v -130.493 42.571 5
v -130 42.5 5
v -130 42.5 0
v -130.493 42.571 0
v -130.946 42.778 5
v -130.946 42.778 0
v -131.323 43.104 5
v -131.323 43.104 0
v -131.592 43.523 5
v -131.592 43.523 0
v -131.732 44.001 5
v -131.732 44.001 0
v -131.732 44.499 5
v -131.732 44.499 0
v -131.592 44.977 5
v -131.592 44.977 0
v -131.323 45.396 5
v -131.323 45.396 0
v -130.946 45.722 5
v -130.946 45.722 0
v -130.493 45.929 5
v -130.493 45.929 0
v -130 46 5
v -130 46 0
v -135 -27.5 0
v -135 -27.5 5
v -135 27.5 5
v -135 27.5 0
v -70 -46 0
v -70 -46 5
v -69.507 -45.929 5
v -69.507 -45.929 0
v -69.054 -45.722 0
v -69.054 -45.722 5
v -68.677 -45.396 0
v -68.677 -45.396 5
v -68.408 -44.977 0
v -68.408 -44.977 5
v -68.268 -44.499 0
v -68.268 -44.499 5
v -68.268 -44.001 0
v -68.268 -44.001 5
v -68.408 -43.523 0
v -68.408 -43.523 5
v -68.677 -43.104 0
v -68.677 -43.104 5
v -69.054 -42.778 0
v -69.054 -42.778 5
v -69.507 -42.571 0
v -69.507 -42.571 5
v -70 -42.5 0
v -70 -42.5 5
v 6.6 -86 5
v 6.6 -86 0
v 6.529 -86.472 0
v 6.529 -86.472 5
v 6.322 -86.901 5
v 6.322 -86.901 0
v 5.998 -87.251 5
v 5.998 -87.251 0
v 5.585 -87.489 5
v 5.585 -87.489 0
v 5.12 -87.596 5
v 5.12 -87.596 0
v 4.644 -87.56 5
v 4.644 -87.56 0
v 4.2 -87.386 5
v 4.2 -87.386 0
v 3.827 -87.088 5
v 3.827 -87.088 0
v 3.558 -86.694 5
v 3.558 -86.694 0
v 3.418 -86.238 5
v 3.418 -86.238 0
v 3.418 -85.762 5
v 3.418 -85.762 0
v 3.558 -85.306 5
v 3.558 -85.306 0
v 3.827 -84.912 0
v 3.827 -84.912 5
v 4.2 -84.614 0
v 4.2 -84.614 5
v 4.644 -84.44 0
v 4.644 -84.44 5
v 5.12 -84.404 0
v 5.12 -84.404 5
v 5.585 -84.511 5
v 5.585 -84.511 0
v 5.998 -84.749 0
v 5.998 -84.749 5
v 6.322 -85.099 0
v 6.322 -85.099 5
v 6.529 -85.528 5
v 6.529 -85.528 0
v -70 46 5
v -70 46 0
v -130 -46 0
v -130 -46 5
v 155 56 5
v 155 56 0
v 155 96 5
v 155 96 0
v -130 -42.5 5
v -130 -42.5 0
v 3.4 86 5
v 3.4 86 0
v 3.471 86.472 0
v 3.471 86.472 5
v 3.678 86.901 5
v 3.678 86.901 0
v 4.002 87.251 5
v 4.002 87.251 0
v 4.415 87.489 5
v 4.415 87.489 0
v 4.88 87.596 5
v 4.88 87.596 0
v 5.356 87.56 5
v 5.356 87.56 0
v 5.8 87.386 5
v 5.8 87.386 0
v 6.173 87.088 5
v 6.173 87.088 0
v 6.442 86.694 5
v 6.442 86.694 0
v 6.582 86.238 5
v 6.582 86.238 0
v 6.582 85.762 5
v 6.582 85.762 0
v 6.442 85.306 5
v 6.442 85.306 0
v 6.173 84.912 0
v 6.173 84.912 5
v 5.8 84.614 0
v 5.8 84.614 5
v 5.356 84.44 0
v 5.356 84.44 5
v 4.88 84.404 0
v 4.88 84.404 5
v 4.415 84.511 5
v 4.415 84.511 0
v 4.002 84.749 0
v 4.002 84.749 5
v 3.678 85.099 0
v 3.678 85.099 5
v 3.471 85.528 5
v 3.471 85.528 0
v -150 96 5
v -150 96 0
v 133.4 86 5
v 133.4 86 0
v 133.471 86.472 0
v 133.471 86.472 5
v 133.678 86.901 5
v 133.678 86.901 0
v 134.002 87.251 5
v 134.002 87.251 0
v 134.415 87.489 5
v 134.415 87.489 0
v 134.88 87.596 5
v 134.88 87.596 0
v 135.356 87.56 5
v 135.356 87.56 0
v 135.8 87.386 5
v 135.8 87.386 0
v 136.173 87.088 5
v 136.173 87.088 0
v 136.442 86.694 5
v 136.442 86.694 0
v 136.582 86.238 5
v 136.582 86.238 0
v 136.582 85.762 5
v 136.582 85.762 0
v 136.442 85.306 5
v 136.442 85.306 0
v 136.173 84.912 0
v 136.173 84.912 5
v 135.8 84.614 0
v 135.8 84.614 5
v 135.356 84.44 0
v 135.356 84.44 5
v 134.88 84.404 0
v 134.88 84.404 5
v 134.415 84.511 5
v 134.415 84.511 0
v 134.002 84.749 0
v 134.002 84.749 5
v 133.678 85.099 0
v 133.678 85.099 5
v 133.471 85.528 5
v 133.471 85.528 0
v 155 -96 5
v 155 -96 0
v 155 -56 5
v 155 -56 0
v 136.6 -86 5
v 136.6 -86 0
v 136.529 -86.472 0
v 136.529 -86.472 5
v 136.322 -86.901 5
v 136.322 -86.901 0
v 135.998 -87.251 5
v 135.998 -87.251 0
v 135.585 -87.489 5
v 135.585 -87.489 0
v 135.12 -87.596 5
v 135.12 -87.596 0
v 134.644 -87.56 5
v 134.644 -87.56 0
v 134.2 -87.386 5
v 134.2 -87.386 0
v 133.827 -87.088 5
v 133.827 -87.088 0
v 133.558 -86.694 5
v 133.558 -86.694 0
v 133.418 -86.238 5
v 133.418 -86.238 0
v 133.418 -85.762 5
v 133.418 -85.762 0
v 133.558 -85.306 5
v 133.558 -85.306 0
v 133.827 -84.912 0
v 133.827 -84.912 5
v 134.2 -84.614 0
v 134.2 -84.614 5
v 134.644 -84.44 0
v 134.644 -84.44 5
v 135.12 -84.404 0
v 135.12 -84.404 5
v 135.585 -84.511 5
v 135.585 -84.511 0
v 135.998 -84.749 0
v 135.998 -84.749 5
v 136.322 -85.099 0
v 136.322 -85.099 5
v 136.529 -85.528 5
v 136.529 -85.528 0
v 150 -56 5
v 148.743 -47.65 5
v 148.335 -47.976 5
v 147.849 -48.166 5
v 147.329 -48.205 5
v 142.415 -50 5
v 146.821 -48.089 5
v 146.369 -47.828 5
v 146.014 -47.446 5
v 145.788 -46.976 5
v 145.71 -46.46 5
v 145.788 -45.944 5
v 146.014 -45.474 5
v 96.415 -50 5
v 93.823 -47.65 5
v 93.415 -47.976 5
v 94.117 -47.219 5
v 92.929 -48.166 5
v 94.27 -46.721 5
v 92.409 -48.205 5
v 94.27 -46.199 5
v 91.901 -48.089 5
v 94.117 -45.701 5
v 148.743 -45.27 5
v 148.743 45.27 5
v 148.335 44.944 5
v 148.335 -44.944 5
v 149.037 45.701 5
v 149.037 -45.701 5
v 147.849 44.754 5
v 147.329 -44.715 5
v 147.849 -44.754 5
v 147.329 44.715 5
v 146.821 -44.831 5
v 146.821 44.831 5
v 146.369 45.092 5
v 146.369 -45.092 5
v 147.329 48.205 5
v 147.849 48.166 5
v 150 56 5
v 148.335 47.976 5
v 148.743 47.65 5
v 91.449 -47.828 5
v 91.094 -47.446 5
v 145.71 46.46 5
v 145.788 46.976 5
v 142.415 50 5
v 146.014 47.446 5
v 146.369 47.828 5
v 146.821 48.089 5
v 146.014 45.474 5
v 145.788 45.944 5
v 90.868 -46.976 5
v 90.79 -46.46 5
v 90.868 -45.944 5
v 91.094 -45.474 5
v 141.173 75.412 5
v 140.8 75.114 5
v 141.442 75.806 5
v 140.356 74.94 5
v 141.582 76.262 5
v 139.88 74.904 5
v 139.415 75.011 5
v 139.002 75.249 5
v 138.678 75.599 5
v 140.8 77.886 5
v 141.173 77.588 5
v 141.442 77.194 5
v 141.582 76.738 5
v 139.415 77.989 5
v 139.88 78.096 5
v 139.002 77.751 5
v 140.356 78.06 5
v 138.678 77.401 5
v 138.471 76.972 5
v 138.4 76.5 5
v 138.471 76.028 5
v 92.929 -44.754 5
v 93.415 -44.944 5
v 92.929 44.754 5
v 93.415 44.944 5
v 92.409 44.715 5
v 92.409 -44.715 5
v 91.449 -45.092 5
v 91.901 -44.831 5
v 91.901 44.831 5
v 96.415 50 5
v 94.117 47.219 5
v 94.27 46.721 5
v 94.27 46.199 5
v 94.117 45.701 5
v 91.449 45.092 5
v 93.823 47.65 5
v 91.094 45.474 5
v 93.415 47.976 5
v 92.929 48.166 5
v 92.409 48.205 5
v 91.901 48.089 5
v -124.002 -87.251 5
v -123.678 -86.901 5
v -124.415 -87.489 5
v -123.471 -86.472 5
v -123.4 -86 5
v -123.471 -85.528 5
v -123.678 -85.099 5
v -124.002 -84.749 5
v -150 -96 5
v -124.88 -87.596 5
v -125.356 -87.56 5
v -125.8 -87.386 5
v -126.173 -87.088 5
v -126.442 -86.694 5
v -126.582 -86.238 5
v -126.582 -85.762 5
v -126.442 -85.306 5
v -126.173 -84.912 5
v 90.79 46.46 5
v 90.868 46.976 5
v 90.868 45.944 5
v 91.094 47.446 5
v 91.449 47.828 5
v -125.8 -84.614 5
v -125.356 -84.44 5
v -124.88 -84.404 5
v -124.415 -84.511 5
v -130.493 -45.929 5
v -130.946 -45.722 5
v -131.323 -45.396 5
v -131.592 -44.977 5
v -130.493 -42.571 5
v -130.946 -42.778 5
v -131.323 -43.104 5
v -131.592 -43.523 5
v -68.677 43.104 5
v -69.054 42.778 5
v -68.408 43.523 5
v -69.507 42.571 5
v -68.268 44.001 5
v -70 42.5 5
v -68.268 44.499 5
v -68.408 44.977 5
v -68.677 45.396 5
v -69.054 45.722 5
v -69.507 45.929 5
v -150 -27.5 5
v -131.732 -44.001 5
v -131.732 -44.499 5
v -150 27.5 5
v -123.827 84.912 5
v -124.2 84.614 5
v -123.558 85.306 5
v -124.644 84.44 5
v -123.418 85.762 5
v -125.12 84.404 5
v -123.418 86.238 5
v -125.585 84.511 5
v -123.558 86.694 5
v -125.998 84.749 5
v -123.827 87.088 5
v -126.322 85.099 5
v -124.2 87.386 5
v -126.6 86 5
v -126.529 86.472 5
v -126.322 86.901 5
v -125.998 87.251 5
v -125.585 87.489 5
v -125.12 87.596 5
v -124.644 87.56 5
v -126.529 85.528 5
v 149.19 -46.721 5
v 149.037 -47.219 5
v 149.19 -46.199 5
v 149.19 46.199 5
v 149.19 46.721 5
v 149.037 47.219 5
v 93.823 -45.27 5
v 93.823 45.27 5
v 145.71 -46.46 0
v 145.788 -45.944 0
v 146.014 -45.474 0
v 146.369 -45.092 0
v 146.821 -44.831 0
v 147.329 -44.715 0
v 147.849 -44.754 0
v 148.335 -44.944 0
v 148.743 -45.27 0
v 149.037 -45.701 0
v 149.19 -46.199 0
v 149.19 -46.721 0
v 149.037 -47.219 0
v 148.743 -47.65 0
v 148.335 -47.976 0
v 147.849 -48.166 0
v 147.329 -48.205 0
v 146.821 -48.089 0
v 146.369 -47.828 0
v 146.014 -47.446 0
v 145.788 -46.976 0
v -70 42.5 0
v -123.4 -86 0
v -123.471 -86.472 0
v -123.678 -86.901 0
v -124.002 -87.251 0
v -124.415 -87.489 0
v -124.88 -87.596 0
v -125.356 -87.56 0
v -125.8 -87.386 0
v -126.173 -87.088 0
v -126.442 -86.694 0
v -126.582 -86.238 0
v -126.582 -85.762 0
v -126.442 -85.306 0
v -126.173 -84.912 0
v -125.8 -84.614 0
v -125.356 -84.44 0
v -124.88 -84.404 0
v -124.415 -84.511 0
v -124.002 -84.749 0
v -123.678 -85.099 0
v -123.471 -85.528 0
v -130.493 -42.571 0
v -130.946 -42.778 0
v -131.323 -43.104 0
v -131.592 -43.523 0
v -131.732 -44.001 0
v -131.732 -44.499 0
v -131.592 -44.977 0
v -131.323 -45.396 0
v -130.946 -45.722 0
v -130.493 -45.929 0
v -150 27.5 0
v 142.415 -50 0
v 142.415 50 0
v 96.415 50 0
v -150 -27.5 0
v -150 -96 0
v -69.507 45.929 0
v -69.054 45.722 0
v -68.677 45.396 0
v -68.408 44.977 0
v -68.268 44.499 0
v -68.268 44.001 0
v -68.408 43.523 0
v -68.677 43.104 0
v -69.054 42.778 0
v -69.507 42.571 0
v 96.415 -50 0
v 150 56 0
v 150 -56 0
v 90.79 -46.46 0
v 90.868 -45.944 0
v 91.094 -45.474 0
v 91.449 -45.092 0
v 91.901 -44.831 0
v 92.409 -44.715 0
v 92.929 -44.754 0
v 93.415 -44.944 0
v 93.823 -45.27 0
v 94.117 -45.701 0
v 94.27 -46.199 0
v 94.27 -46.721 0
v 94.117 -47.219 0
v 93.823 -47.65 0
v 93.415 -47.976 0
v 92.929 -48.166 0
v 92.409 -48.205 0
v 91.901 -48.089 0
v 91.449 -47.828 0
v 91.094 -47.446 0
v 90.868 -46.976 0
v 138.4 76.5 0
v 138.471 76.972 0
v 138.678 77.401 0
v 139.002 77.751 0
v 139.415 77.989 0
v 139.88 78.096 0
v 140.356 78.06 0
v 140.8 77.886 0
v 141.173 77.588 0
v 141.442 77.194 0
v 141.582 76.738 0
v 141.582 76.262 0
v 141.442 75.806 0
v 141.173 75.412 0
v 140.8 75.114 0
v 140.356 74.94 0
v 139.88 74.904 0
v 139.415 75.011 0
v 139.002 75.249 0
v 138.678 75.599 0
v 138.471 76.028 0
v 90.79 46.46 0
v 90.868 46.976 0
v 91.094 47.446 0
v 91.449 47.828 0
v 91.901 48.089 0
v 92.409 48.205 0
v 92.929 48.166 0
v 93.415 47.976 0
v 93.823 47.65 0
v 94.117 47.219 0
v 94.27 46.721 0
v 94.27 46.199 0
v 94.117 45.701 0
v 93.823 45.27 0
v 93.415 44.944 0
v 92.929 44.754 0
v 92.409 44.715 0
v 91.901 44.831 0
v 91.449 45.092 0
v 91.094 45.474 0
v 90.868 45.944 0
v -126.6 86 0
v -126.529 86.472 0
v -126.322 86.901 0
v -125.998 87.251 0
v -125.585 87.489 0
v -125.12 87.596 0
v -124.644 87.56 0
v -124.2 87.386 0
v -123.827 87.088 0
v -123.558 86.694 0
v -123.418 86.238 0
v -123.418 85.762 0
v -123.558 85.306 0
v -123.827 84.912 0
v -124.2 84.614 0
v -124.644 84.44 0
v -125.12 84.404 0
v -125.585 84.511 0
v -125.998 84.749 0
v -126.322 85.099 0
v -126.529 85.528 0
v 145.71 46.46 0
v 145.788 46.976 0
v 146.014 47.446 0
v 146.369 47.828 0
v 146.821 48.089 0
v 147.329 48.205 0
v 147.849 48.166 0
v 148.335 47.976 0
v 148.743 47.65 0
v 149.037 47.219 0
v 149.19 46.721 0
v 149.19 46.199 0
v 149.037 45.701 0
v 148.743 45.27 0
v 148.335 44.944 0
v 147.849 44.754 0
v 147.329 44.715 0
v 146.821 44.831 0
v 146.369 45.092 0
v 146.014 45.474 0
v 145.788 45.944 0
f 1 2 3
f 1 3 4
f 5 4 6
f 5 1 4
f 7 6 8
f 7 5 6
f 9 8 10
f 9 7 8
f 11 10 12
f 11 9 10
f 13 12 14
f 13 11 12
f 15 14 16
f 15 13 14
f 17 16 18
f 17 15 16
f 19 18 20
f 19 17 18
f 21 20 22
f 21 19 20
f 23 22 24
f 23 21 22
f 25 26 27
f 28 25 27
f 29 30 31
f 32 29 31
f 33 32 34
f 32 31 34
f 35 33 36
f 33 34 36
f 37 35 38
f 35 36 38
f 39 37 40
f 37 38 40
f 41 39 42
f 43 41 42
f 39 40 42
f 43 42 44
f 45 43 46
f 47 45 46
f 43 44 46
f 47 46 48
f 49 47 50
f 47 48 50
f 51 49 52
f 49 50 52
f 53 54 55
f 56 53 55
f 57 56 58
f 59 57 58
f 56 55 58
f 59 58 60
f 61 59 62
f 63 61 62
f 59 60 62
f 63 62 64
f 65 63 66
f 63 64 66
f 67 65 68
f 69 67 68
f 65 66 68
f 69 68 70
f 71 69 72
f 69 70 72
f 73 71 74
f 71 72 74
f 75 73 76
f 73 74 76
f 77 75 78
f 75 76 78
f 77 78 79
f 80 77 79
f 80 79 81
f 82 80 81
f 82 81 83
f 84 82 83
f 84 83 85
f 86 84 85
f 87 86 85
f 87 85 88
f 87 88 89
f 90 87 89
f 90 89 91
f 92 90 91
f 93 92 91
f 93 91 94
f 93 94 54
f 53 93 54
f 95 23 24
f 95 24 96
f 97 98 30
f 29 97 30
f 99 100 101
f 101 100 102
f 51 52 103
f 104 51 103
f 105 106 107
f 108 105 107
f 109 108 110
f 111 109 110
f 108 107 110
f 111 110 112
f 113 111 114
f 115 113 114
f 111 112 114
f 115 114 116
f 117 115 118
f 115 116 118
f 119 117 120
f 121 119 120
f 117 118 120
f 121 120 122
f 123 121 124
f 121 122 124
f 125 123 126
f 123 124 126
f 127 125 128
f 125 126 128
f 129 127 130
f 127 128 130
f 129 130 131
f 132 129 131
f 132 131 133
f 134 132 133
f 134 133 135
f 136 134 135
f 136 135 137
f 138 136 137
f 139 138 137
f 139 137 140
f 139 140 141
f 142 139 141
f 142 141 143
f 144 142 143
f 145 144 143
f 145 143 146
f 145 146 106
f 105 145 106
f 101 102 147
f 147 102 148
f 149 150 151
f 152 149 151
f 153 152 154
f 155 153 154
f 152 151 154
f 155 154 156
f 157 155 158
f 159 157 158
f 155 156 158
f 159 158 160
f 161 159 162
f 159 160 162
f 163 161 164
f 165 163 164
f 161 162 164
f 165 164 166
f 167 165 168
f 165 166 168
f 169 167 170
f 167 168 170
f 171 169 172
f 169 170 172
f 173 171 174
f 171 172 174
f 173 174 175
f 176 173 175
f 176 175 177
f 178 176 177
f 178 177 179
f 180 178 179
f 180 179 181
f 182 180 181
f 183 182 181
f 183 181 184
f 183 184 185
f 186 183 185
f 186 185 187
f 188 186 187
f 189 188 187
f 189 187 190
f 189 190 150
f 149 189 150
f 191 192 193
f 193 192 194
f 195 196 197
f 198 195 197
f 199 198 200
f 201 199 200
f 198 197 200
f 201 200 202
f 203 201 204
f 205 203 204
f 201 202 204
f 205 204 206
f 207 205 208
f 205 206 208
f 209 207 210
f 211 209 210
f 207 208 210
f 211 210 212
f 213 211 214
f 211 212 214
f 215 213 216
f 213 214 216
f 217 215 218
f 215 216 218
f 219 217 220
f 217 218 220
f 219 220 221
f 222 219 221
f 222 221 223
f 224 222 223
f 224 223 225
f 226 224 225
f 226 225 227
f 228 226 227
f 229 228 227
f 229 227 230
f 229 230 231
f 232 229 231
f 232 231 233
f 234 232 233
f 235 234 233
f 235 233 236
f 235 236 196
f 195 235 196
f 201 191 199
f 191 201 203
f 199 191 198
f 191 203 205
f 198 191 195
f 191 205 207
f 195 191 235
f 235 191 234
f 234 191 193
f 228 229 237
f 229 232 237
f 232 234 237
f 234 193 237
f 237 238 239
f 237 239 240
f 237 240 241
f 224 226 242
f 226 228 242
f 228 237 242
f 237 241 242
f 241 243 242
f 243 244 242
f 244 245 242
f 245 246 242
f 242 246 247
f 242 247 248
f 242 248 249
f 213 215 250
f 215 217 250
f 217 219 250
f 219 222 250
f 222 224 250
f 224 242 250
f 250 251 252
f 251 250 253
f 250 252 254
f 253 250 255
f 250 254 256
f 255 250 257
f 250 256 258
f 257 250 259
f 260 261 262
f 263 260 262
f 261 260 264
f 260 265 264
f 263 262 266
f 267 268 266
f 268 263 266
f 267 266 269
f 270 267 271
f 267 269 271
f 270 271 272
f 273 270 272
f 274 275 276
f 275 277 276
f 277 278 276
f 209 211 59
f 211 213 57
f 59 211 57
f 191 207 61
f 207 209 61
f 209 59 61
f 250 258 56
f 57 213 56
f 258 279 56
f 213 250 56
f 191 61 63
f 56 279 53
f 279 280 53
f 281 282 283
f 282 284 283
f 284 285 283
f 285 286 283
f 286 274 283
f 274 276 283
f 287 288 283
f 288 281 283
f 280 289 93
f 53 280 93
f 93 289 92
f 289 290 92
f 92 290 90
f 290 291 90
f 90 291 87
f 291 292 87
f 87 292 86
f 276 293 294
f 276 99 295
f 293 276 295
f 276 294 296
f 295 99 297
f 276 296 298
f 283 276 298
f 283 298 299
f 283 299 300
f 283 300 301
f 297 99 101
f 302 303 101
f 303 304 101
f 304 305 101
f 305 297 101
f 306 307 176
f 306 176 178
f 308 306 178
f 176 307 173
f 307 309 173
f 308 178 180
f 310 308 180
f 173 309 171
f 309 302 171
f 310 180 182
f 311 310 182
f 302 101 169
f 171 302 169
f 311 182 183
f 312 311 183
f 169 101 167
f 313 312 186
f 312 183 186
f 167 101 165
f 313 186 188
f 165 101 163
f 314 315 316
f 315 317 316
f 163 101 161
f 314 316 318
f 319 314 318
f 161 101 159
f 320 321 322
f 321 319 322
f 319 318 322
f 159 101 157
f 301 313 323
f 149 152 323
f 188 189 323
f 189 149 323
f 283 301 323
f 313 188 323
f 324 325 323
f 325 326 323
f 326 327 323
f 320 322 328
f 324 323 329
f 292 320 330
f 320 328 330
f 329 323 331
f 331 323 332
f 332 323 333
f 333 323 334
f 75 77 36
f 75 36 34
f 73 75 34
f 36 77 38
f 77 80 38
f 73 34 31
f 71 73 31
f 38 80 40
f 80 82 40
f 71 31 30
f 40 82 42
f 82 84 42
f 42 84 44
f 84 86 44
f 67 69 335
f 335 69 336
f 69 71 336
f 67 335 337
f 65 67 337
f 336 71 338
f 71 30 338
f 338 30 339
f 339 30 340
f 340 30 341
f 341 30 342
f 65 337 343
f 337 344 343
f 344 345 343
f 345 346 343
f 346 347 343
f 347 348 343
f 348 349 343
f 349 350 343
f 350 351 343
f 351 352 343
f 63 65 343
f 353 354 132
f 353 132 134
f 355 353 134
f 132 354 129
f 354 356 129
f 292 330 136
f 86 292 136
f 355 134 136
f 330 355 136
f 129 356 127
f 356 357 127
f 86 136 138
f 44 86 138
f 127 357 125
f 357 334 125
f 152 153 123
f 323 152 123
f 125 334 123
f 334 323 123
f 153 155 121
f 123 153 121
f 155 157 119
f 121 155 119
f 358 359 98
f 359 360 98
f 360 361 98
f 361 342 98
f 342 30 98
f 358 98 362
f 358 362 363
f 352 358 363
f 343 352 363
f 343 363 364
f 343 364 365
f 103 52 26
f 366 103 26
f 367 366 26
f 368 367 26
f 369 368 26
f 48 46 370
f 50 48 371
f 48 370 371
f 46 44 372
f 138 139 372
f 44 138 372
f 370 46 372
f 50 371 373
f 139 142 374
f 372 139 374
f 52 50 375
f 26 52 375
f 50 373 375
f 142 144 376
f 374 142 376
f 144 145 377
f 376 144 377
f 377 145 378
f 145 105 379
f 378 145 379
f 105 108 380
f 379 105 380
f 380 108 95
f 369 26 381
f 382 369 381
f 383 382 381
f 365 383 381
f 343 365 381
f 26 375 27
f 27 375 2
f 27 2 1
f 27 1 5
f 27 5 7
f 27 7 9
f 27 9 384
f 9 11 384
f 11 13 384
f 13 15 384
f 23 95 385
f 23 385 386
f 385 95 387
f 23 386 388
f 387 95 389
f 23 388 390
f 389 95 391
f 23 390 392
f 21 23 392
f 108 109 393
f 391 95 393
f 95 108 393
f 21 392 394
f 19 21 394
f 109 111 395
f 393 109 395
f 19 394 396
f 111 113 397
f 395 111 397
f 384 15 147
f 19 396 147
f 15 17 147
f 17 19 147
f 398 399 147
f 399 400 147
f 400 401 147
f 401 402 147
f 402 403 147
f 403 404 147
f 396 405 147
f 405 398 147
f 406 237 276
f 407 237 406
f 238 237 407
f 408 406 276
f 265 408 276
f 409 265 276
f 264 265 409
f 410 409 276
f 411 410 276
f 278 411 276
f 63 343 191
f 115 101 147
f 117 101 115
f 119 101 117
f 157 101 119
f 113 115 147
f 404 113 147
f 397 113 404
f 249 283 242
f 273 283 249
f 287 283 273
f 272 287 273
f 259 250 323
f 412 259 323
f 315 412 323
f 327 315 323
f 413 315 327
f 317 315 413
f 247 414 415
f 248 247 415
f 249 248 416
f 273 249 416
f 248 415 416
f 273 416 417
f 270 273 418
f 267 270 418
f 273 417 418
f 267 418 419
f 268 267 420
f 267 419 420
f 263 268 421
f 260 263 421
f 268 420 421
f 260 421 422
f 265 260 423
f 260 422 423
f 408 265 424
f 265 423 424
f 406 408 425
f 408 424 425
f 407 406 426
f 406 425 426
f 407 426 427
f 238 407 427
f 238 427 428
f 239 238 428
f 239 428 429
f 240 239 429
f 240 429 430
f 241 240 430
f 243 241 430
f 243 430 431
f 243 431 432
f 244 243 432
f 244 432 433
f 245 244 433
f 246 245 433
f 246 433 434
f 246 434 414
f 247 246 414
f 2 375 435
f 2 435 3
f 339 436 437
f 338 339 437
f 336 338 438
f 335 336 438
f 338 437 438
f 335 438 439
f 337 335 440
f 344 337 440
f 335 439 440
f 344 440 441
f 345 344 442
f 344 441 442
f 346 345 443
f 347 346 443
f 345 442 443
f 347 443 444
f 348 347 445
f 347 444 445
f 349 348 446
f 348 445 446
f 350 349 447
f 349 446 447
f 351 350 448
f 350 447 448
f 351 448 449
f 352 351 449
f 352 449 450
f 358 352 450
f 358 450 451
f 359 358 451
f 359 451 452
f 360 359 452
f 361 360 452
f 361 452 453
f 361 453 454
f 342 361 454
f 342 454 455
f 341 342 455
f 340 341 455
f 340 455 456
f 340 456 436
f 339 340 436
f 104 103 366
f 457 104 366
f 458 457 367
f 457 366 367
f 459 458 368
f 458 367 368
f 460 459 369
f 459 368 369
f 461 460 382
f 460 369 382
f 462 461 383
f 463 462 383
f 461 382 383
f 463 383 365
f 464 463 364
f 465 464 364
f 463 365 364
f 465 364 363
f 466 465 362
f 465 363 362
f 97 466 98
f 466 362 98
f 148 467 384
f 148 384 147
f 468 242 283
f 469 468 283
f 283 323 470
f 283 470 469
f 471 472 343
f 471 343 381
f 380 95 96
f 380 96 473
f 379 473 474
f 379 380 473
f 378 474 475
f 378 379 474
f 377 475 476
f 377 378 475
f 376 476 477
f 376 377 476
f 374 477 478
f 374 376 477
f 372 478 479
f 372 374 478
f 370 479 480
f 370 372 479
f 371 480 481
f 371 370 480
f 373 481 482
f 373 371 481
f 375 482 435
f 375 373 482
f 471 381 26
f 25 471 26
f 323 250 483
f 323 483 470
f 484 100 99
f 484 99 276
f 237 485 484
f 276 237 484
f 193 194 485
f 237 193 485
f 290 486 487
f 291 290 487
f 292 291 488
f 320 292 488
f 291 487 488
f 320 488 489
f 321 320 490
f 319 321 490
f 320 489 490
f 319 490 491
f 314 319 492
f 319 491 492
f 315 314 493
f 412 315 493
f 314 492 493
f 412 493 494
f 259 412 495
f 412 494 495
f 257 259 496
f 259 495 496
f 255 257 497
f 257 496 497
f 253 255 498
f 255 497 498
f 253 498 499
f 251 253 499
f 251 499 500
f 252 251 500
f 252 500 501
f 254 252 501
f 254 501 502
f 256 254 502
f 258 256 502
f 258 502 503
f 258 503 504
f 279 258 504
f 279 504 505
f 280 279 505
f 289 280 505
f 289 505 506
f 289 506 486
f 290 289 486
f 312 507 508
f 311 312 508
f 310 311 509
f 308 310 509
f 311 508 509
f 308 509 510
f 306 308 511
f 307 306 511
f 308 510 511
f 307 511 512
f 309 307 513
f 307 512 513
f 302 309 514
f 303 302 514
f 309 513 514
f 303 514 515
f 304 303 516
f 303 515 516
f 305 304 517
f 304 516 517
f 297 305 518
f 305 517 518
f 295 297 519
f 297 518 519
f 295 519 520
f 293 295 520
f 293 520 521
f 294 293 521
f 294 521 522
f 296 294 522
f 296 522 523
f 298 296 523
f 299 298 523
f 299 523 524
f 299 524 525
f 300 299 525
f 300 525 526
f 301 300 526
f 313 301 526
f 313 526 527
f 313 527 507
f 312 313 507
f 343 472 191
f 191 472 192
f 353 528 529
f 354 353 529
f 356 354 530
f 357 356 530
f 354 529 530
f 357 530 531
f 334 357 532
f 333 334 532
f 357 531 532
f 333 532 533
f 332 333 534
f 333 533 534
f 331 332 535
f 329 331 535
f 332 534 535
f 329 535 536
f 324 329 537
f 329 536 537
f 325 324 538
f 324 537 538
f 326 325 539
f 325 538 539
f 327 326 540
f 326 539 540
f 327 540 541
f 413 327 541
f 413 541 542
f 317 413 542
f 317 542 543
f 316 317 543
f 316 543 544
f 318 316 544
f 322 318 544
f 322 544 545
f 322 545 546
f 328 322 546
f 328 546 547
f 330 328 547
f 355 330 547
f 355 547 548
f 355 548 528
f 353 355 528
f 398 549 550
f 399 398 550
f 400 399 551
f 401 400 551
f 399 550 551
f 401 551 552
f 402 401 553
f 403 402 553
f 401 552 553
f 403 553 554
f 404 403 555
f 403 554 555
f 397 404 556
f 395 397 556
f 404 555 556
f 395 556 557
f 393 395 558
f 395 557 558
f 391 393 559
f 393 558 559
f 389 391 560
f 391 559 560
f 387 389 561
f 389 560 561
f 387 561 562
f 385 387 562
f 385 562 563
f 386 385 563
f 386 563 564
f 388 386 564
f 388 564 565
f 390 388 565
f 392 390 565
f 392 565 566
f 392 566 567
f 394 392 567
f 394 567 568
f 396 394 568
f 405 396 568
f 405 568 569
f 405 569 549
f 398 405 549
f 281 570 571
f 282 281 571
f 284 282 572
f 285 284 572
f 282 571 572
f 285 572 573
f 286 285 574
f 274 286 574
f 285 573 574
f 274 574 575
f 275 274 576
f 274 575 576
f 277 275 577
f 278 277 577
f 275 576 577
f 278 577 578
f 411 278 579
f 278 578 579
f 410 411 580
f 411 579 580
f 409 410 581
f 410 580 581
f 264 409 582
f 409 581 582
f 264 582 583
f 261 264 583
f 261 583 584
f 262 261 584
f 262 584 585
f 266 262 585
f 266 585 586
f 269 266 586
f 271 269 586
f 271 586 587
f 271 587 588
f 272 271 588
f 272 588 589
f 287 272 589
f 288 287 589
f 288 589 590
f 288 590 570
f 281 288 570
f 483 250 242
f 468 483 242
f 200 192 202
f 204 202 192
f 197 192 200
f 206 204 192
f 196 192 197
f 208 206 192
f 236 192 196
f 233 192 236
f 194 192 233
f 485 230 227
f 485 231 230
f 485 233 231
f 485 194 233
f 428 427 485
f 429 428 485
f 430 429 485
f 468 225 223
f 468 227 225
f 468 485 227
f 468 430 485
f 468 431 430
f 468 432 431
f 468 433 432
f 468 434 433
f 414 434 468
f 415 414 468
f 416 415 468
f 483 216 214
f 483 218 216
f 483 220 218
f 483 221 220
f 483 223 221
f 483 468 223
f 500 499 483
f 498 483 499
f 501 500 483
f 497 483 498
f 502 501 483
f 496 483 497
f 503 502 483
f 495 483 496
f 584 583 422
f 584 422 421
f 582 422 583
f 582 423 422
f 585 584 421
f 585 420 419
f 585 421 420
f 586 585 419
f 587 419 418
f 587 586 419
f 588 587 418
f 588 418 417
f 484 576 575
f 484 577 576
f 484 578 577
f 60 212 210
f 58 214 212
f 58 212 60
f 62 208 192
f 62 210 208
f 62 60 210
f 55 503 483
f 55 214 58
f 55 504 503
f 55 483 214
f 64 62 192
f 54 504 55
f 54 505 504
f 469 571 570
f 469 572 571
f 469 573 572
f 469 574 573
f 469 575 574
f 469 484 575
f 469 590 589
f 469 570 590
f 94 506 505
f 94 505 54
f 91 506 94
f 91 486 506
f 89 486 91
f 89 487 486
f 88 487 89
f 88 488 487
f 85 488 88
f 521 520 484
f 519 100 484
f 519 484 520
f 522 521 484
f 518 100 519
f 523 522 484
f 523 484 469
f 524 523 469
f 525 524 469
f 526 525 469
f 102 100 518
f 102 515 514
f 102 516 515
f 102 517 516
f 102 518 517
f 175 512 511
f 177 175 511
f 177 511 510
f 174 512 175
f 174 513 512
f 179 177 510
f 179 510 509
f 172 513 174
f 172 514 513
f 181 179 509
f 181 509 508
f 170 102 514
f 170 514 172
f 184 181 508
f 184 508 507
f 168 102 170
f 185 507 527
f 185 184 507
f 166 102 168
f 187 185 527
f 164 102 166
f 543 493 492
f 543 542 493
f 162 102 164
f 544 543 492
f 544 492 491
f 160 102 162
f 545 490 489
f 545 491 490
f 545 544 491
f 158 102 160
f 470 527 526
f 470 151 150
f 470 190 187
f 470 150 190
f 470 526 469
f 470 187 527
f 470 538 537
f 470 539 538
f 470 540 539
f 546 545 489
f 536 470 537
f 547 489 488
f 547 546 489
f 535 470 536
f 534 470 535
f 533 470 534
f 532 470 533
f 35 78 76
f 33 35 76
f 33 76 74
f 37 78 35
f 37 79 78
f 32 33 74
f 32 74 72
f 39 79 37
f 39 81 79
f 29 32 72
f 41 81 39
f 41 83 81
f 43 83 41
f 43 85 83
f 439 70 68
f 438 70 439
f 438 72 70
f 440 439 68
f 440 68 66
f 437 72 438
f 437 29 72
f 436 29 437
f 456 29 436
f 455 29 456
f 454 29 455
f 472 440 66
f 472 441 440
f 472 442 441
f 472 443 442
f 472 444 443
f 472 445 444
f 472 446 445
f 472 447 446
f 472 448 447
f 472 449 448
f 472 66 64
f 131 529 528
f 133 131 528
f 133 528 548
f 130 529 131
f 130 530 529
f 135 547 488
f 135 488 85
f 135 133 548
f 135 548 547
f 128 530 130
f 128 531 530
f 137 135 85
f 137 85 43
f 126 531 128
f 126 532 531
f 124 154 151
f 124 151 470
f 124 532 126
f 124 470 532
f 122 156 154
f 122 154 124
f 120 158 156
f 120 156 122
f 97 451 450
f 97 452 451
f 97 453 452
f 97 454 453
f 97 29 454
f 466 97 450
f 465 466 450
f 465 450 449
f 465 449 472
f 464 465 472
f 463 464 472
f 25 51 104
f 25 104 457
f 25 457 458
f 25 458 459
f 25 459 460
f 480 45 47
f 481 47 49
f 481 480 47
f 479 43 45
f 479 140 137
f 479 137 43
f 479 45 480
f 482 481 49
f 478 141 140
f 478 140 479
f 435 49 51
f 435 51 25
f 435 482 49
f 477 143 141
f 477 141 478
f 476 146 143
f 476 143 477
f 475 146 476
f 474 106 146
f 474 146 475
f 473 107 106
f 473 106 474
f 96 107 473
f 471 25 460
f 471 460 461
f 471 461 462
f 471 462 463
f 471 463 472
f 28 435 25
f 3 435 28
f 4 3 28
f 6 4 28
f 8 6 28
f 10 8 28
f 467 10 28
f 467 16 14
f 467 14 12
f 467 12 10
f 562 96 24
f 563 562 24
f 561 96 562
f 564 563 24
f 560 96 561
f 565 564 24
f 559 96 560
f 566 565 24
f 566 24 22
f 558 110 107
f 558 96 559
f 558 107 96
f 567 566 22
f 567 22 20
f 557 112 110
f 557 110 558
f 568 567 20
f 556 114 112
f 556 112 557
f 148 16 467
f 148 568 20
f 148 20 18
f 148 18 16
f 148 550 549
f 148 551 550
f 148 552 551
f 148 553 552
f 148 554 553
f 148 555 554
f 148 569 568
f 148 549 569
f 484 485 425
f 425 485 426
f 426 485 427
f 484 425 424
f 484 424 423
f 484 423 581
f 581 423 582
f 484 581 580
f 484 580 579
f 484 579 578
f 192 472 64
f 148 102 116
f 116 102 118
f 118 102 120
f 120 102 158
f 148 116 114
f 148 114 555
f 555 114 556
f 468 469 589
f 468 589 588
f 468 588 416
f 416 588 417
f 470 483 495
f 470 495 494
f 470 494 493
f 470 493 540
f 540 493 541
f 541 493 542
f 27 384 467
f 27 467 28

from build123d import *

# Parameters (mm, degrees)
SKETCH1_W           = 300
SKETCH1_H           = 192
BOSS_EXTRUDE1_DEPTH = 5
SKETCH2_R           = 1.75
CUT_EXTRUDE1_DEPTH  = 179.160040413
SKETCH4_W           = 46
SKETCH4_H           = 100
CUT_EXTRUDE2_DEPTH  = 179.160040413
SKETCH5_W           = 15
SKETCH5_H           = 55
CUT_EXTRUDE3_DEPTH  = 179.160040413
SKETCH6_R           = 1.6
CUT_EXTRUDE4_DEPTH  = 179.160040413
SKETCH7_W           = 5
SKETCH7_H           = 40
BOSS_EXTRUDE2_DEPTH = 5
SKETCH8_R           = 1.6
CUT_EXTRUDE5_DEPTH  = 183.389692691


with BuildPart() as part:
    # Sketch1 → Boss-Extrude1 (new body)
    with BuildSketch(Plane.XY):
        Rectangle(SKETCH1_W, SKETCH1_H)
    extrude(amount=BOSS_EXTRUDE1_DEPTH)

    # Sketch2 → Cut-Extrude1 (cut, through all)
    with BuildSketch(Plane(origin=(0, 0, 0), x_dir=(-1, 0, 0), z_dir=(0, 0, -1))):
        with Locations((-147.46, 46.46)):
            Circle(SKETCH2_R)
        with Locations((-147.46, -46.46)):
            Circle(SKETCH2_R)
        with Locations((-92.54, 46.46)):
            Circle(SKETCH2_R)
        with Locations((-92.54, -46.46)):
            Circle(SKETCH2_R)
    extrude(amount=-CUT_EXTRUDE1_DEPTH, mode=Mode.SUBTRACT)

    # Sketch4 → Cut-Extrude2 (cut, through all)
    with BuildSketch(Plane.XY.offset(5)):
        with Locations((119.414990718, 0)):
            Rectangle(SKETCH4_W, SKETCH4_H)
    extrude(amount=-CUT_EXTRUDE2_DEPTH, mode=Mode.SUBTRACT)

    # Sketch5 → Cut-Extrude3 (cut, through all)
    with BuildSketch(Plane.XY.offset(5)):
        with BuildLine():
            Line((-70, 42.5), (-130, 42.5))
            ThreePointArc((-130, 42.5), (-131.75, 44.25), (-130, 46))
            Line((-130, 46), (-70, 46))
            ThreePointArc((-70, 46), (-68.25, 44.25), (-70, 42.5))
        make_face()
        with BuildLine():
            Line((-70, -42.5), (-130, -42.5))
            ThreePointArc((-130, -42.5), (-131.75, -44.25), (-130, -46))
            Line((-130, -46), (-70, -46))
            ThreePointArc((-70, -46), (-68.25, -44.25), (-70, -42.5))
        make_face()
        with Locations((-142.5, 0)):
            Rectangle(SKETCH5_W, SKETCH5_H)
    extrude(amount=-CUT_EXTRUDE3_DEPTH, mode=Mode.SUBTRACT)

    # Sketch6 → Cut-Extrude4 (cut, through all)
    with BuildSketch(Plane(origin=(0, 0, 0), x_dir=(-1, 0, 0), z_dir=(0, 0, -1))):
        with Locations((-135, 86)):
            Circle(SKETCH6_R)
        with Locations((-5, 86)):
            Circle(SKETCH6_R)
        with Locations((125, 86)):
            Circle(SKETCH6_R)
        with Locations(Location((125, -86, 0), (0, 0, 180))):
            Circle(SKETCH6_R)
        with Locations(Location((-5, -86, 0), (0, 0, 180))):
            Circle(SKETCH6_R)
        with Locations(Location((-135, -86, 0), (0, 0, 180))):
            Circle(SKETCH6_R)
    extrude(amount=-CUT_EXTRUDE4_DEPTH, mode=Mode.SUBTRACT)

    # Sketch7 → Boss-Extrude2 (add)
    with BuildSketch(Plane(origin=(0, 0, 0), x_dir=(-1, 0, 0), z_dir=(0, 0, -1))):
        with Locations((-152.5, 76)):
            Rectangle(SKETCH7_W, SKETCH7_H)
        with Locations((-152.5, -76)):
            Rectangle(SKETCH7_W, SKETCH7_H)
    extrude(amount=-BOSS_EXTRUDE2_DEPTH)

    # Sketch8 → Cut-Extrude5 (cut, through all)
    with BuildSketch(Plane(origin=(0, 0, 0), x_dir=(-1, 0, 0), z_dir=(0, 0, -1))):
        with Locations((-140, 76.5)):
            Circle(SKETCH8_R)
    extrude(amount=-CUT_EXTRUDE5_DEPTH, mode=Mode.SUBTRACT)


solid = part.part
